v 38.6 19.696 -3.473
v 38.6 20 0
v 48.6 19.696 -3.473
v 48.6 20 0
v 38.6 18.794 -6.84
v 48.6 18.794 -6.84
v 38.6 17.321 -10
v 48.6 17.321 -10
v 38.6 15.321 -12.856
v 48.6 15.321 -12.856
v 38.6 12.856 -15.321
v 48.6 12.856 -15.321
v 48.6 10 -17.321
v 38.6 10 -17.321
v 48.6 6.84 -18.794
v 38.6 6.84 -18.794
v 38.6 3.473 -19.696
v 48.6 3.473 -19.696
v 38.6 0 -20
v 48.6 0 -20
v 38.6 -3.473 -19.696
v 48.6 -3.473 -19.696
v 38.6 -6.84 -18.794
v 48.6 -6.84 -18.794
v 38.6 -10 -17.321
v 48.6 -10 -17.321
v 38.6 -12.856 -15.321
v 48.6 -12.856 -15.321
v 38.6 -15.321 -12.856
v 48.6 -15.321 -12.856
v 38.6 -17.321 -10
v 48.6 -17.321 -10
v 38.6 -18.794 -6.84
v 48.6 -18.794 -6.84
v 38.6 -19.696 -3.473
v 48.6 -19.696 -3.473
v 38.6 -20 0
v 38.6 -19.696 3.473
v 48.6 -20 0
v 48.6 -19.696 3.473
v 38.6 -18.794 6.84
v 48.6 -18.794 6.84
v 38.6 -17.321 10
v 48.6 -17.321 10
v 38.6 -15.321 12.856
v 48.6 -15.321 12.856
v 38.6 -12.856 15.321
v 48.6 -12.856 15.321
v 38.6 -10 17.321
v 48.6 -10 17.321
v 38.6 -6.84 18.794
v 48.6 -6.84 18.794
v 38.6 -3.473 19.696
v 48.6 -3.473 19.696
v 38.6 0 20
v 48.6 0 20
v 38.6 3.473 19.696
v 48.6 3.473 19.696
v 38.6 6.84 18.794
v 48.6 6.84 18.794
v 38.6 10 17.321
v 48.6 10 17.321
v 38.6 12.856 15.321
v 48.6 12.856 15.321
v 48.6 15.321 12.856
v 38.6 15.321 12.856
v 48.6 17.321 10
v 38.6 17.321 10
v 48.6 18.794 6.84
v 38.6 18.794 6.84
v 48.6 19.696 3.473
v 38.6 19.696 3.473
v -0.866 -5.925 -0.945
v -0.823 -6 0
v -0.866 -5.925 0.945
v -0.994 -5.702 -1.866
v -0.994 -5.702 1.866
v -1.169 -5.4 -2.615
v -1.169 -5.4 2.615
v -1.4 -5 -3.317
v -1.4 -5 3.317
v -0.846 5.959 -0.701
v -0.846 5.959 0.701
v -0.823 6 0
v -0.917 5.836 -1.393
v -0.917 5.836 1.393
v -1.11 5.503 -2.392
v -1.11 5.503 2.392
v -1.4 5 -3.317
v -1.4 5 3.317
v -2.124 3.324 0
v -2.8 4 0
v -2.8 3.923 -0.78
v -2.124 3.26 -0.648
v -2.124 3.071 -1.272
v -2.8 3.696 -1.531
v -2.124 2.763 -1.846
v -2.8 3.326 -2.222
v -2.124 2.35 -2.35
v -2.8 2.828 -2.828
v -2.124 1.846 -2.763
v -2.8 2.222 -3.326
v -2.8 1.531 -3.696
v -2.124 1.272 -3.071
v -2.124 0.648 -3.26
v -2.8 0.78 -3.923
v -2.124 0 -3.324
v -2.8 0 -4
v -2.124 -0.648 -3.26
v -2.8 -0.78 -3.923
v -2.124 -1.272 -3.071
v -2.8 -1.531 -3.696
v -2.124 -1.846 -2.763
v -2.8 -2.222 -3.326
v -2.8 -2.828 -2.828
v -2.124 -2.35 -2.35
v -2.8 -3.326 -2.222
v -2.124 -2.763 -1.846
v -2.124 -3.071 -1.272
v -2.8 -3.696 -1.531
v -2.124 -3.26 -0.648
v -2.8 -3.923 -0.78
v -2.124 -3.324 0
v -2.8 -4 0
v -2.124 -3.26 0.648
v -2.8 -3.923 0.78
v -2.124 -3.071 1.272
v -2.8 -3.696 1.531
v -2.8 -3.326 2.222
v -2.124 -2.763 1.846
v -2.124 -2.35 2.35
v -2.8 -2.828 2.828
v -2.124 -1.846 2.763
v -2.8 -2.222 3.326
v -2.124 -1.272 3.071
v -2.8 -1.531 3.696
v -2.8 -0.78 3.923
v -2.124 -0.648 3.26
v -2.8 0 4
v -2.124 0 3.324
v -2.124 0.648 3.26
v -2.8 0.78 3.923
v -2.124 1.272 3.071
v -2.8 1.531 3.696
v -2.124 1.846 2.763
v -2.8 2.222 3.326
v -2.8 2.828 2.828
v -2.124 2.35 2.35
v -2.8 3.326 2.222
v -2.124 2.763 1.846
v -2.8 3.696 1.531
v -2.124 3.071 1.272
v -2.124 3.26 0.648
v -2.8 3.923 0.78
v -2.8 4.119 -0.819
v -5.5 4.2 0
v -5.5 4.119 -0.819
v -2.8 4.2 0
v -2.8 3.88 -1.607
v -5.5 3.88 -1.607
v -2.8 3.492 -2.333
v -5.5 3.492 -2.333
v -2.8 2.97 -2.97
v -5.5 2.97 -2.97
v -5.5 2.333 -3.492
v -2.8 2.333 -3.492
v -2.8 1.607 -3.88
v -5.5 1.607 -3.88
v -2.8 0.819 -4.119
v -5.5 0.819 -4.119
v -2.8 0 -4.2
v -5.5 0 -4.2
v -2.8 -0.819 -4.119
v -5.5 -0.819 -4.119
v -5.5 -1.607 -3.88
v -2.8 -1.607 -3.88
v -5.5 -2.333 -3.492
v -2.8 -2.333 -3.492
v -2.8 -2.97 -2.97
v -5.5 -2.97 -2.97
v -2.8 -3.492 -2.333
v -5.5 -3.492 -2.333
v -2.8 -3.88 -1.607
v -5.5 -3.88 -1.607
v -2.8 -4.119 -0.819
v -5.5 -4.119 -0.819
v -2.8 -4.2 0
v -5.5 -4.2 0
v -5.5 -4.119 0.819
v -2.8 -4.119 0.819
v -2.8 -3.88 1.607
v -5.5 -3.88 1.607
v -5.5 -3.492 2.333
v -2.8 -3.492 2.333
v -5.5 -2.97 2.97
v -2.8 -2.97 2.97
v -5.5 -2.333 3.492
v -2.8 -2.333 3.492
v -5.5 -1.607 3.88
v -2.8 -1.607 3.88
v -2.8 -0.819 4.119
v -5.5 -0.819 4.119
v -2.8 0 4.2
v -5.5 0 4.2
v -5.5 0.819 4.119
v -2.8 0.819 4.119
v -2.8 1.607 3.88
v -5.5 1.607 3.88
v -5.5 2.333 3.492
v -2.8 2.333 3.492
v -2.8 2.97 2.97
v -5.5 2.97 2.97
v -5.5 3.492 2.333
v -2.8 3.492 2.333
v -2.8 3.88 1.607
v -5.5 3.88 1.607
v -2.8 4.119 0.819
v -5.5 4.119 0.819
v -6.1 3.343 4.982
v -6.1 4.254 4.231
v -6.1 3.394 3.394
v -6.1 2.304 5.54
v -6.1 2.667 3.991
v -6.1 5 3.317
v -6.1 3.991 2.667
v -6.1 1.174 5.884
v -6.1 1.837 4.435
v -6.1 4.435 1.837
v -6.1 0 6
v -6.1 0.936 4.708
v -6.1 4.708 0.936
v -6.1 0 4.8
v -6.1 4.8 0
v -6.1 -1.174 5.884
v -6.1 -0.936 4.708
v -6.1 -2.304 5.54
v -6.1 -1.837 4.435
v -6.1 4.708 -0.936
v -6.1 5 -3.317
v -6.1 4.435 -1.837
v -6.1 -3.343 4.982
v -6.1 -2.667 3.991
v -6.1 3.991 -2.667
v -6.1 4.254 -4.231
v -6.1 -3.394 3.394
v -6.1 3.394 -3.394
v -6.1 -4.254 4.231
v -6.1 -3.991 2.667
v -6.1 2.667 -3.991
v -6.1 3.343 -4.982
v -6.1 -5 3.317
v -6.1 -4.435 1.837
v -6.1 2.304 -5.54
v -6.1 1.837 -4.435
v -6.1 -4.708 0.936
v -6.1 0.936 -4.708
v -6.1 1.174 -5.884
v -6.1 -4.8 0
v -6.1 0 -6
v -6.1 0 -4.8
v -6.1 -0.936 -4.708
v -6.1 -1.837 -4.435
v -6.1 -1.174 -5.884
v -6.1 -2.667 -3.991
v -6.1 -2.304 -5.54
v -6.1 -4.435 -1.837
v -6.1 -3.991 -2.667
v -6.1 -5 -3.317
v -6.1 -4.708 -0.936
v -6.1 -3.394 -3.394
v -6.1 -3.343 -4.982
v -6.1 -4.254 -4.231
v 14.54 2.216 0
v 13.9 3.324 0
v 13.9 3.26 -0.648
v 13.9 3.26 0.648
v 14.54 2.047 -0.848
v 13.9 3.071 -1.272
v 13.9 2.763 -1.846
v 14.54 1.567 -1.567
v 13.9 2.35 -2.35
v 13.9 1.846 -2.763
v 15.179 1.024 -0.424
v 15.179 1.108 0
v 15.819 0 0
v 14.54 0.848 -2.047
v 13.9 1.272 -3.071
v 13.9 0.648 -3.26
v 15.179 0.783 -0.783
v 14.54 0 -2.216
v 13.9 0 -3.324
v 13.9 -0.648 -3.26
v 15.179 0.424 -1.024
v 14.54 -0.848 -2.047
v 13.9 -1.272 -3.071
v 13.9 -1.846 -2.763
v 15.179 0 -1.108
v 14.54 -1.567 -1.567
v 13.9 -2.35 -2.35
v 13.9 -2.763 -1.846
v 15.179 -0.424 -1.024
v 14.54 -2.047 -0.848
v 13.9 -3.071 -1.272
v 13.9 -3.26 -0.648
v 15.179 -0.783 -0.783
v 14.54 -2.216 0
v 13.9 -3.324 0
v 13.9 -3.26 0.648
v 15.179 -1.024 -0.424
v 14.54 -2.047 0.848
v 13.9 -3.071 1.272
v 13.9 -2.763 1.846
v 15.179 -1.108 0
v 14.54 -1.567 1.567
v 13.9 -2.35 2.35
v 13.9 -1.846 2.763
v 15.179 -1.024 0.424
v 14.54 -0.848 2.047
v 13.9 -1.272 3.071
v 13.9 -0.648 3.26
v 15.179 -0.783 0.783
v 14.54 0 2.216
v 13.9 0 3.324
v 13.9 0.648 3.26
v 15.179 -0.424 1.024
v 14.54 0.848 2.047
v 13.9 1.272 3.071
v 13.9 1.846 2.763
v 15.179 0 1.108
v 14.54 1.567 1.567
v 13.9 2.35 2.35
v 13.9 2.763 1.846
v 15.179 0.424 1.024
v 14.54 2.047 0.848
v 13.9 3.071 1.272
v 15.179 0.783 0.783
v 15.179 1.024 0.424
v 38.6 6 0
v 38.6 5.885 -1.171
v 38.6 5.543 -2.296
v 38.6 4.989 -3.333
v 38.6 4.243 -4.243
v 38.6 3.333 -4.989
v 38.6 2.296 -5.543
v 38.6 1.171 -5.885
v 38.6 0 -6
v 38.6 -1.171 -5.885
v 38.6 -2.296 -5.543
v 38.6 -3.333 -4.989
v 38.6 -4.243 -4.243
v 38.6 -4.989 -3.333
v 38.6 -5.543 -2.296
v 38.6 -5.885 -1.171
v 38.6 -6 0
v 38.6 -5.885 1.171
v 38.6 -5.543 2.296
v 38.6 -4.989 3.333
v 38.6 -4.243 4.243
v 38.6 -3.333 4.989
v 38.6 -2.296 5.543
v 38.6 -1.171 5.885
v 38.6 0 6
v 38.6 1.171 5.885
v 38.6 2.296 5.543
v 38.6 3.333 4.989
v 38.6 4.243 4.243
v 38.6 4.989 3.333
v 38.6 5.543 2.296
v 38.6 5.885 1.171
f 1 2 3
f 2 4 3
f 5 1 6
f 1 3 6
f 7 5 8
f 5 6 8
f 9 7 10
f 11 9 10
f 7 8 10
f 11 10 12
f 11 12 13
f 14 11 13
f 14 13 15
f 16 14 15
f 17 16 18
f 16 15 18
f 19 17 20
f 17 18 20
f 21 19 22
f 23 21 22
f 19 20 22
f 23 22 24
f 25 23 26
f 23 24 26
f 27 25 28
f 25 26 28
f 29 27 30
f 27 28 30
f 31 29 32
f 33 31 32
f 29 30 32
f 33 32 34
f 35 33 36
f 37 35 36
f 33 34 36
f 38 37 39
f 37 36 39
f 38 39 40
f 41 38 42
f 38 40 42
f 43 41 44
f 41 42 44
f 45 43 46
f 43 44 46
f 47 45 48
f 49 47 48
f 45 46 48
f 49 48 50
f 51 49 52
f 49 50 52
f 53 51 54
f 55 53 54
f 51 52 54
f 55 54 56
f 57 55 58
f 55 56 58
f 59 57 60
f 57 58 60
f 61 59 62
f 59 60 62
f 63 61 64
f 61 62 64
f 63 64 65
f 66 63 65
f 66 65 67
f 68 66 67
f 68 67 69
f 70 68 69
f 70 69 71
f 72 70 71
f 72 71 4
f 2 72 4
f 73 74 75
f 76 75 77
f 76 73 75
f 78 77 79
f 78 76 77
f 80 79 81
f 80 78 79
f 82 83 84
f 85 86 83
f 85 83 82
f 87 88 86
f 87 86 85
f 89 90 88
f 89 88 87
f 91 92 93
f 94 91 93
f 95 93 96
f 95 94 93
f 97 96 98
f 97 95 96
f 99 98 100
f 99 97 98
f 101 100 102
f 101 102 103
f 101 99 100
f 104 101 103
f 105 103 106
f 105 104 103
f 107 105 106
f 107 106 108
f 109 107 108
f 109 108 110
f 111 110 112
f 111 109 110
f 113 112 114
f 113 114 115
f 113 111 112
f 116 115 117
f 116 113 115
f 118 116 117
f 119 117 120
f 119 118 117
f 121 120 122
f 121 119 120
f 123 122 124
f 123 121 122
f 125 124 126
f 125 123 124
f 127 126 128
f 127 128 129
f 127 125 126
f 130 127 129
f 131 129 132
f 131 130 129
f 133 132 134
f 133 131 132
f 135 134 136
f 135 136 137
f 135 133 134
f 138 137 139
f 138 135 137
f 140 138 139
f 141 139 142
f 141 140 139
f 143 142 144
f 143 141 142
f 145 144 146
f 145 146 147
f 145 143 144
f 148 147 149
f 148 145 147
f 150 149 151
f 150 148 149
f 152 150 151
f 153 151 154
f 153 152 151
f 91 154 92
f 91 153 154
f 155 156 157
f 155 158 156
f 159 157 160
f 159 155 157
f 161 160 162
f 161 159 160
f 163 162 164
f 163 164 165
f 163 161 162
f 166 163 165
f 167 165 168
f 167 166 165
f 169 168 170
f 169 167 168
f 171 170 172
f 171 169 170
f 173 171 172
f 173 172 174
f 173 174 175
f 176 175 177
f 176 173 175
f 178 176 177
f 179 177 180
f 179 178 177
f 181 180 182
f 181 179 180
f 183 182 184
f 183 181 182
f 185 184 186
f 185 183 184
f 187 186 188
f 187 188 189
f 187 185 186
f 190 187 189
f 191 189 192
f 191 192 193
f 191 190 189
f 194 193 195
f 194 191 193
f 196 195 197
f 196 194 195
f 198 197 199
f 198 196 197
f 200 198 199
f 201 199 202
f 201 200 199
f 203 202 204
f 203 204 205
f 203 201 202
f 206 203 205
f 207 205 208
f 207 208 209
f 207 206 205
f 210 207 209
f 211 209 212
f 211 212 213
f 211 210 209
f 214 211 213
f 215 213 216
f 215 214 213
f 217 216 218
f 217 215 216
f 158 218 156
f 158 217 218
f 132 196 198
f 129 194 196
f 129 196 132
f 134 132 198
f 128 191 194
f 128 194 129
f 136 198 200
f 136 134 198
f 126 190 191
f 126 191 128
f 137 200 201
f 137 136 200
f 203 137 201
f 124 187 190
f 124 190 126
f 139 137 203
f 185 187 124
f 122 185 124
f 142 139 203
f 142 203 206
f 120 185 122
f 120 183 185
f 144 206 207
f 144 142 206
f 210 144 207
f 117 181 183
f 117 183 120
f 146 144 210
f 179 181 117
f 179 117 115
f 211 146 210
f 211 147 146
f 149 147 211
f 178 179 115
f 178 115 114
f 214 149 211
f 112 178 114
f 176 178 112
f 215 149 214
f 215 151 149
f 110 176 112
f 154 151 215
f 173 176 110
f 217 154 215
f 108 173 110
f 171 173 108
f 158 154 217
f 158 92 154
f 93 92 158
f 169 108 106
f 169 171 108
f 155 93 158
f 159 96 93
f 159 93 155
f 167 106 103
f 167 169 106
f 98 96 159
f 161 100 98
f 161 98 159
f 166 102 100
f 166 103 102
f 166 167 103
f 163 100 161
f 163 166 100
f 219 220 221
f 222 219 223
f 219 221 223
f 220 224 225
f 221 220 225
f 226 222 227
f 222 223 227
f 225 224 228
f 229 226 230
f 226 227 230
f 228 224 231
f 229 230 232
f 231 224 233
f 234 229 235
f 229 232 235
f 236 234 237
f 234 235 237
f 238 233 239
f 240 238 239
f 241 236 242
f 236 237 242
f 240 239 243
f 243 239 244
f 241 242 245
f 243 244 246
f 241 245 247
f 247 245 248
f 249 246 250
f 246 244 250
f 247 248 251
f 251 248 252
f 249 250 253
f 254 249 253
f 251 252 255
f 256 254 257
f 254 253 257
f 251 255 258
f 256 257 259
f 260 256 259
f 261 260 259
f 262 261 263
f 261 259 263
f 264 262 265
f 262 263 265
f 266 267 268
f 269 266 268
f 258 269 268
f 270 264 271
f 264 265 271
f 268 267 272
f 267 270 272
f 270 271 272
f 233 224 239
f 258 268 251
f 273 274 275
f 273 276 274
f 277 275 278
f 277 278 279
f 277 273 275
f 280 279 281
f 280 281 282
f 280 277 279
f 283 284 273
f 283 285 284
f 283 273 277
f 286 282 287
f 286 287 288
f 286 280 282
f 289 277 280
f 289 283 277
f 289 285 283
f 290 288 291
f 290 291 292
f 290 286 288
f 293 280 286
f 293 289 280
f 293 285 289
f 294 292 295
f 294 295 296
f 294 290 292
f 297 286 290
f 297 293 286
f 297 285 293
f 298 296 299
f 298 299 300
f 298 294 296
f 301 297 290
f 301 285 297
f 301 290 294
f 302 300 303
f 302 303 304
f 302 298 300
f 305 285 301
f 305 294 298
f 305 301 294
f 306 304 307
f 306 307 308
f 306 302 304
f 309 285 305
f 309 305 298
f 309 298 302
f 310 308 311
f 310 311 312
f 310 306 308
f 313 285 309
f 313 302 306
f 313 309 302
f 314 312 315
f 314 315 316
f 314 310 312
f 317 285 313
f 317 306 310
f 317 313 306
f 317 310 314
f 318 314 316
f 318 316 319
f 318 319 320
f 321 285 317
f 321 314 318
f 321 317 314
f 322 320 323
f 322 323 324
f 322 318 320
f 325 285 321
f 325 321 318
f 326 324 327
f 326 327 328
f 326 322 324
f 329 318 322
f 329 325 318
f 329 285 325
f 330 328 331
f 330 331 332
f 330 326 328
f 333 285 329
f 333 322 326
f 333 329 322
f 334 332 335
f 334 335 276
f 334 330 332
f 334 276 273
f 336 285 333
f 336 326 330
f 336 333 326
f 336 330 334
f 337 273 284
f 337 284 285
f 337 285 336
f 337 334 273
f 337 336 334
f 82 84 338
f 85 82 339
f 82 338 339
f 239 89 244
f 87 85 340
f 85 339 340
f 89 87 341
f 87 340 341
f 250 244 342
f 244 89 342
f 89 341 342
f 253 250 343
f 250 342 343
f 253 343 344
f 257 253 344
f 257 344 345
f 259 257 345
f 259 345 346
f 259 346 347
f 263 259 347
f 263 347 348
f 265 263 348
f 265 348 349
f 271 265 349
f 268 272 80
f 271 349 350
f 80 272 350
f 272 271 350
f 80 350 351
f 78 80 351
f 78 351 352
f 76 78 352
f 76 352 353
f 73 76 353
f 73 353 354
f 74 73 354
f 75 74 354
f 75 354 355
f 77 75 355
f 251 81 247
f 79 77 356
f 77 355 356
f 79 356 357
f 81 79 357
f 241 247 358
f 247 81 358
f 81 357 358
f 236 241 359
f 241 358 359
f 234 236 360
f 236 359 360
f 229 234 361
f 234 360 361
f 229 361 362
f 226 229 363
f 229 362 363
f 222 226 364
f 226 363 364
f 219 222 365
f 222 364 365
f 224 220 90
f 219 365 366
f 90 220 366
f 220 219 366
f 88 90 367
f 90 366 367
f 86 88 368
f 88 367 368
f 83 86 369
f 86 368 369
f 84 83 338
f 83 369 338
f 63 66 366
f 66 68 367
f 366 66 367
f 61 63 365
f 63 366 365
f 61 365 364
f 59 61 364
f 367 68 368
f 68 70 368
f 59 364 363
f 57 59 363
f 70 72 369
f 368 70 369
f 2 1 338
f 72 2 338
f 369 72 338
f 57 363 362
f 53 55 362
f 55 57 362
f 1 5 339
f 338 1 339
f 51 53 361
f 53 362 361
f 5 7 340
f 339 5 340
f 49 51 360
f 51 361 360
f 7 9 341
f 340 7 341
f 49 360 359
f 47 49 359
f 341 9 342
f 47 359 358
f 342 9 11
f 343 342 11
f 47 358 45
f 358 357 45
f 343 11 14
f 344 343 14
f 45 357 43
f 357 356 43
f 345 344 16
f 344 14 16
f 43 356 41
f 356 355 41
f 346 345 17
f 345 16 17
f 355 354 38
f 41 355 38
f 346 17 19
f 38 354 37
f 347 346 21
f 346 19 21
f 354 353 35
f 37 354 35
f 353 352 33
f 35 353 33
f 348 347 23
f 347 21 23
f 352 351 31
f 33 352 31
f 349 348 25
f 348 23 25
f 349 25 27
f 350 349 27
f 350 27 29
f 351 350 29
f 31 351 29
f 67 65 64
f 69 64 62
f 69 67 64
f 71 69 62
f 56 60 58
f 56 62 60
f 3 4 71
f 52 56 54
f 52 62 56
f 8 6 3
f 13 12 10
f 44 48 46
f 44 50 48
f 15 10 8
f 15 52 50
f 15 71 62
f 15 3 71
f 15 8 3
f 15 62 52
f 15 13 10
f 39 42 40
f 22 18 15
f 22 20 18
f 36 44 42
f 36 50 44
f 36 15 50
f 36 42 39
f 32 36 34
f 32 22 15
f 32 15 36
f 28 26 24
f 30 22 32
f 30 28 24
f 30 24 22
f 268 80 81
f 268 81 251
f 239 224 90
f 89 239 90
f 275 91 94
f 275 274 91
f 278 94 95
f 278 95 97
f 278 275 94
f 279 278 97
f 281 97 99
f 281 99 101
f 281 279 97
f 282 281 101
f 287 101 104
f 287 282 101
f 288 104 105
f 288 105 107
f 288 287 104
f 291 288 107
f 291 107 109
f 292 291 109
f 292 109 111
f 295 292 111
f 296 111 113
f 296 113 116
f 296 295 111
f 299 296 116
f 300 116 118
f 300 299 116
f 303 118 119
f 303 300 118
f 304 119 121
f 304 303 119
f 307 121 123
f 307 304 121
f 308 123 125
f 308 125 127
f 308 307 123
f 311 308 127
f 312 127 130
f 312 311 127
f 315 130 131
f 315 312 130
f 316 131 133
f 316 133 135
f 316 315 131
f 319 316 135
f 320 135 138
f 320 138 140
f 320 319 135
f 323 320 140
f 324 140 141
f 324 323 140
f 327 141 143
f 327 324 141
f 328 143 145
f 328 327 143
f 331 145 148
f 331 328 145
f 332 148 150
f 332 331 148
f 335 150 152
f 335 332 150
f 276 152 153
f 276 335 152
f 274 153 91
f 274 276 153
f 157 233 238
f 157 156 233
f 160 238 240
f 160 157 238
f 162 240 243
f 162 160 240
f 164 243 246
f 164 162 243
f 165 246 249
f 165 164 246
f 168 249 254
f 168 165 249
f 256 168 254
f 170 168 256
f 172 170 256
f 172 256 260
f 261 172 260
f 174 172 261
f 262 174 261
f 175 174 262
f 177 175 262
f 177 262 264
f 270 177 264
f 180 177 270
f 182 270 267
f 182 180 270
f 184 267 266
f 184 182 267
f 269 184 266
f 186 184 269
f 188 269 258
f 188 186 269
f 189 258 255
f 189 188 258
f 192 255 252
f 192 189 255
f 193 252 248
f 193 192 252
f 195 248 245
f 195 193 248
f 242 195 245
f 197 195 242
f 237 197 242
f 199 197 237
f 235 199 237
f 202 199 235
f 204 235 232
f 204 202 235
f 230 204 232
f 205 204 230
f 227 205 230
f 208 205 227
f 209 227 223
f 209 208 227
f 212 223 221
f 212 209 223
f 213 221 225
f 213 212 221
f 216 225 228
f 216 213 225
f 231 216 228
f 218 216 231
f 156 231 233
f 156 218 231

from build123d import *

# Parameters (mm, degrees)
SKIZZE1_W                            = 54.7
SKIZZE1_H                            = 6
SKIZZE2_W                            = 10
SKIZZE2_H                            = 20
SCHNITT_LINEAR_AUSTRAGEN1_DEPTH      = 12
SCHNITT_LINEAR_AUSTRAGEN1_DEPTH_BACK = 12


with BuildPart() as part:
    # Skizze1 → Rotation1 (revolve)
    with BuildSketch(Plane.XY):
        with Locations((21.25, 3)):
            Rectangle(SKIZZE1_W, SKIZZE1_H)
    revolve(axis=Axis((48.6, 0, 0), (-1, 0, 0)))

    # Skizze2 → Rotation2 (revolve)
    with BuildSketch(Plane.XY):
        with Locations((43.6, 10)):
            Rectangle(SKIZZE2_W, SKIZZE2_H)
    revolve(axis=Axis((48.6, 0, 0), (-1, 0, 0)))

    # Skizze3 → Schnitt-Linear austragen1 (cut, two sides: drawn at the far end of the back side and taken through both)
    with BuildSketch(Plane.XY.offset(-SCHNITT_LINEAR_AUSTRAGEN1_DEPTH_BACK)):
        Polygon((-36.2, -16), (4.950852961, -16), (-1.4, -5), (-6.1, -5), (-6.1, -10), (-30.1, -10), (-30.1, 10), (-6.1, 10), (-6.1, 5), (-1.4, 5), (4.950852961, 16), (-36.2, 16), align=None)
    extrude(amount=SCHNITT_LINEAR_AUSTRAGEN1_DEPTH + SCHNITT_LINEAR_AUSTRAGEN1_DEPTH_BACK, mode=Mode.SUBTRACT)

    # Skizze4 → Schnitt-Rotation1 (revolve, cut)
    with BuildSketch(Plane.XY):
        Polygon((-6.1, 0), (-6.1, 4.8), (-5.5, 4.2), (-2.8, 4.2), (-2.8, 4), (-2.1235, 3.3235), (13.9, 3.3235), (15.81882362, 0), align=None)
    revolve(axis=Axis((15.81882362, 0, 0), (-1, 0, 0)), mode=Mode.SUBTRACT)


solid = part.part
